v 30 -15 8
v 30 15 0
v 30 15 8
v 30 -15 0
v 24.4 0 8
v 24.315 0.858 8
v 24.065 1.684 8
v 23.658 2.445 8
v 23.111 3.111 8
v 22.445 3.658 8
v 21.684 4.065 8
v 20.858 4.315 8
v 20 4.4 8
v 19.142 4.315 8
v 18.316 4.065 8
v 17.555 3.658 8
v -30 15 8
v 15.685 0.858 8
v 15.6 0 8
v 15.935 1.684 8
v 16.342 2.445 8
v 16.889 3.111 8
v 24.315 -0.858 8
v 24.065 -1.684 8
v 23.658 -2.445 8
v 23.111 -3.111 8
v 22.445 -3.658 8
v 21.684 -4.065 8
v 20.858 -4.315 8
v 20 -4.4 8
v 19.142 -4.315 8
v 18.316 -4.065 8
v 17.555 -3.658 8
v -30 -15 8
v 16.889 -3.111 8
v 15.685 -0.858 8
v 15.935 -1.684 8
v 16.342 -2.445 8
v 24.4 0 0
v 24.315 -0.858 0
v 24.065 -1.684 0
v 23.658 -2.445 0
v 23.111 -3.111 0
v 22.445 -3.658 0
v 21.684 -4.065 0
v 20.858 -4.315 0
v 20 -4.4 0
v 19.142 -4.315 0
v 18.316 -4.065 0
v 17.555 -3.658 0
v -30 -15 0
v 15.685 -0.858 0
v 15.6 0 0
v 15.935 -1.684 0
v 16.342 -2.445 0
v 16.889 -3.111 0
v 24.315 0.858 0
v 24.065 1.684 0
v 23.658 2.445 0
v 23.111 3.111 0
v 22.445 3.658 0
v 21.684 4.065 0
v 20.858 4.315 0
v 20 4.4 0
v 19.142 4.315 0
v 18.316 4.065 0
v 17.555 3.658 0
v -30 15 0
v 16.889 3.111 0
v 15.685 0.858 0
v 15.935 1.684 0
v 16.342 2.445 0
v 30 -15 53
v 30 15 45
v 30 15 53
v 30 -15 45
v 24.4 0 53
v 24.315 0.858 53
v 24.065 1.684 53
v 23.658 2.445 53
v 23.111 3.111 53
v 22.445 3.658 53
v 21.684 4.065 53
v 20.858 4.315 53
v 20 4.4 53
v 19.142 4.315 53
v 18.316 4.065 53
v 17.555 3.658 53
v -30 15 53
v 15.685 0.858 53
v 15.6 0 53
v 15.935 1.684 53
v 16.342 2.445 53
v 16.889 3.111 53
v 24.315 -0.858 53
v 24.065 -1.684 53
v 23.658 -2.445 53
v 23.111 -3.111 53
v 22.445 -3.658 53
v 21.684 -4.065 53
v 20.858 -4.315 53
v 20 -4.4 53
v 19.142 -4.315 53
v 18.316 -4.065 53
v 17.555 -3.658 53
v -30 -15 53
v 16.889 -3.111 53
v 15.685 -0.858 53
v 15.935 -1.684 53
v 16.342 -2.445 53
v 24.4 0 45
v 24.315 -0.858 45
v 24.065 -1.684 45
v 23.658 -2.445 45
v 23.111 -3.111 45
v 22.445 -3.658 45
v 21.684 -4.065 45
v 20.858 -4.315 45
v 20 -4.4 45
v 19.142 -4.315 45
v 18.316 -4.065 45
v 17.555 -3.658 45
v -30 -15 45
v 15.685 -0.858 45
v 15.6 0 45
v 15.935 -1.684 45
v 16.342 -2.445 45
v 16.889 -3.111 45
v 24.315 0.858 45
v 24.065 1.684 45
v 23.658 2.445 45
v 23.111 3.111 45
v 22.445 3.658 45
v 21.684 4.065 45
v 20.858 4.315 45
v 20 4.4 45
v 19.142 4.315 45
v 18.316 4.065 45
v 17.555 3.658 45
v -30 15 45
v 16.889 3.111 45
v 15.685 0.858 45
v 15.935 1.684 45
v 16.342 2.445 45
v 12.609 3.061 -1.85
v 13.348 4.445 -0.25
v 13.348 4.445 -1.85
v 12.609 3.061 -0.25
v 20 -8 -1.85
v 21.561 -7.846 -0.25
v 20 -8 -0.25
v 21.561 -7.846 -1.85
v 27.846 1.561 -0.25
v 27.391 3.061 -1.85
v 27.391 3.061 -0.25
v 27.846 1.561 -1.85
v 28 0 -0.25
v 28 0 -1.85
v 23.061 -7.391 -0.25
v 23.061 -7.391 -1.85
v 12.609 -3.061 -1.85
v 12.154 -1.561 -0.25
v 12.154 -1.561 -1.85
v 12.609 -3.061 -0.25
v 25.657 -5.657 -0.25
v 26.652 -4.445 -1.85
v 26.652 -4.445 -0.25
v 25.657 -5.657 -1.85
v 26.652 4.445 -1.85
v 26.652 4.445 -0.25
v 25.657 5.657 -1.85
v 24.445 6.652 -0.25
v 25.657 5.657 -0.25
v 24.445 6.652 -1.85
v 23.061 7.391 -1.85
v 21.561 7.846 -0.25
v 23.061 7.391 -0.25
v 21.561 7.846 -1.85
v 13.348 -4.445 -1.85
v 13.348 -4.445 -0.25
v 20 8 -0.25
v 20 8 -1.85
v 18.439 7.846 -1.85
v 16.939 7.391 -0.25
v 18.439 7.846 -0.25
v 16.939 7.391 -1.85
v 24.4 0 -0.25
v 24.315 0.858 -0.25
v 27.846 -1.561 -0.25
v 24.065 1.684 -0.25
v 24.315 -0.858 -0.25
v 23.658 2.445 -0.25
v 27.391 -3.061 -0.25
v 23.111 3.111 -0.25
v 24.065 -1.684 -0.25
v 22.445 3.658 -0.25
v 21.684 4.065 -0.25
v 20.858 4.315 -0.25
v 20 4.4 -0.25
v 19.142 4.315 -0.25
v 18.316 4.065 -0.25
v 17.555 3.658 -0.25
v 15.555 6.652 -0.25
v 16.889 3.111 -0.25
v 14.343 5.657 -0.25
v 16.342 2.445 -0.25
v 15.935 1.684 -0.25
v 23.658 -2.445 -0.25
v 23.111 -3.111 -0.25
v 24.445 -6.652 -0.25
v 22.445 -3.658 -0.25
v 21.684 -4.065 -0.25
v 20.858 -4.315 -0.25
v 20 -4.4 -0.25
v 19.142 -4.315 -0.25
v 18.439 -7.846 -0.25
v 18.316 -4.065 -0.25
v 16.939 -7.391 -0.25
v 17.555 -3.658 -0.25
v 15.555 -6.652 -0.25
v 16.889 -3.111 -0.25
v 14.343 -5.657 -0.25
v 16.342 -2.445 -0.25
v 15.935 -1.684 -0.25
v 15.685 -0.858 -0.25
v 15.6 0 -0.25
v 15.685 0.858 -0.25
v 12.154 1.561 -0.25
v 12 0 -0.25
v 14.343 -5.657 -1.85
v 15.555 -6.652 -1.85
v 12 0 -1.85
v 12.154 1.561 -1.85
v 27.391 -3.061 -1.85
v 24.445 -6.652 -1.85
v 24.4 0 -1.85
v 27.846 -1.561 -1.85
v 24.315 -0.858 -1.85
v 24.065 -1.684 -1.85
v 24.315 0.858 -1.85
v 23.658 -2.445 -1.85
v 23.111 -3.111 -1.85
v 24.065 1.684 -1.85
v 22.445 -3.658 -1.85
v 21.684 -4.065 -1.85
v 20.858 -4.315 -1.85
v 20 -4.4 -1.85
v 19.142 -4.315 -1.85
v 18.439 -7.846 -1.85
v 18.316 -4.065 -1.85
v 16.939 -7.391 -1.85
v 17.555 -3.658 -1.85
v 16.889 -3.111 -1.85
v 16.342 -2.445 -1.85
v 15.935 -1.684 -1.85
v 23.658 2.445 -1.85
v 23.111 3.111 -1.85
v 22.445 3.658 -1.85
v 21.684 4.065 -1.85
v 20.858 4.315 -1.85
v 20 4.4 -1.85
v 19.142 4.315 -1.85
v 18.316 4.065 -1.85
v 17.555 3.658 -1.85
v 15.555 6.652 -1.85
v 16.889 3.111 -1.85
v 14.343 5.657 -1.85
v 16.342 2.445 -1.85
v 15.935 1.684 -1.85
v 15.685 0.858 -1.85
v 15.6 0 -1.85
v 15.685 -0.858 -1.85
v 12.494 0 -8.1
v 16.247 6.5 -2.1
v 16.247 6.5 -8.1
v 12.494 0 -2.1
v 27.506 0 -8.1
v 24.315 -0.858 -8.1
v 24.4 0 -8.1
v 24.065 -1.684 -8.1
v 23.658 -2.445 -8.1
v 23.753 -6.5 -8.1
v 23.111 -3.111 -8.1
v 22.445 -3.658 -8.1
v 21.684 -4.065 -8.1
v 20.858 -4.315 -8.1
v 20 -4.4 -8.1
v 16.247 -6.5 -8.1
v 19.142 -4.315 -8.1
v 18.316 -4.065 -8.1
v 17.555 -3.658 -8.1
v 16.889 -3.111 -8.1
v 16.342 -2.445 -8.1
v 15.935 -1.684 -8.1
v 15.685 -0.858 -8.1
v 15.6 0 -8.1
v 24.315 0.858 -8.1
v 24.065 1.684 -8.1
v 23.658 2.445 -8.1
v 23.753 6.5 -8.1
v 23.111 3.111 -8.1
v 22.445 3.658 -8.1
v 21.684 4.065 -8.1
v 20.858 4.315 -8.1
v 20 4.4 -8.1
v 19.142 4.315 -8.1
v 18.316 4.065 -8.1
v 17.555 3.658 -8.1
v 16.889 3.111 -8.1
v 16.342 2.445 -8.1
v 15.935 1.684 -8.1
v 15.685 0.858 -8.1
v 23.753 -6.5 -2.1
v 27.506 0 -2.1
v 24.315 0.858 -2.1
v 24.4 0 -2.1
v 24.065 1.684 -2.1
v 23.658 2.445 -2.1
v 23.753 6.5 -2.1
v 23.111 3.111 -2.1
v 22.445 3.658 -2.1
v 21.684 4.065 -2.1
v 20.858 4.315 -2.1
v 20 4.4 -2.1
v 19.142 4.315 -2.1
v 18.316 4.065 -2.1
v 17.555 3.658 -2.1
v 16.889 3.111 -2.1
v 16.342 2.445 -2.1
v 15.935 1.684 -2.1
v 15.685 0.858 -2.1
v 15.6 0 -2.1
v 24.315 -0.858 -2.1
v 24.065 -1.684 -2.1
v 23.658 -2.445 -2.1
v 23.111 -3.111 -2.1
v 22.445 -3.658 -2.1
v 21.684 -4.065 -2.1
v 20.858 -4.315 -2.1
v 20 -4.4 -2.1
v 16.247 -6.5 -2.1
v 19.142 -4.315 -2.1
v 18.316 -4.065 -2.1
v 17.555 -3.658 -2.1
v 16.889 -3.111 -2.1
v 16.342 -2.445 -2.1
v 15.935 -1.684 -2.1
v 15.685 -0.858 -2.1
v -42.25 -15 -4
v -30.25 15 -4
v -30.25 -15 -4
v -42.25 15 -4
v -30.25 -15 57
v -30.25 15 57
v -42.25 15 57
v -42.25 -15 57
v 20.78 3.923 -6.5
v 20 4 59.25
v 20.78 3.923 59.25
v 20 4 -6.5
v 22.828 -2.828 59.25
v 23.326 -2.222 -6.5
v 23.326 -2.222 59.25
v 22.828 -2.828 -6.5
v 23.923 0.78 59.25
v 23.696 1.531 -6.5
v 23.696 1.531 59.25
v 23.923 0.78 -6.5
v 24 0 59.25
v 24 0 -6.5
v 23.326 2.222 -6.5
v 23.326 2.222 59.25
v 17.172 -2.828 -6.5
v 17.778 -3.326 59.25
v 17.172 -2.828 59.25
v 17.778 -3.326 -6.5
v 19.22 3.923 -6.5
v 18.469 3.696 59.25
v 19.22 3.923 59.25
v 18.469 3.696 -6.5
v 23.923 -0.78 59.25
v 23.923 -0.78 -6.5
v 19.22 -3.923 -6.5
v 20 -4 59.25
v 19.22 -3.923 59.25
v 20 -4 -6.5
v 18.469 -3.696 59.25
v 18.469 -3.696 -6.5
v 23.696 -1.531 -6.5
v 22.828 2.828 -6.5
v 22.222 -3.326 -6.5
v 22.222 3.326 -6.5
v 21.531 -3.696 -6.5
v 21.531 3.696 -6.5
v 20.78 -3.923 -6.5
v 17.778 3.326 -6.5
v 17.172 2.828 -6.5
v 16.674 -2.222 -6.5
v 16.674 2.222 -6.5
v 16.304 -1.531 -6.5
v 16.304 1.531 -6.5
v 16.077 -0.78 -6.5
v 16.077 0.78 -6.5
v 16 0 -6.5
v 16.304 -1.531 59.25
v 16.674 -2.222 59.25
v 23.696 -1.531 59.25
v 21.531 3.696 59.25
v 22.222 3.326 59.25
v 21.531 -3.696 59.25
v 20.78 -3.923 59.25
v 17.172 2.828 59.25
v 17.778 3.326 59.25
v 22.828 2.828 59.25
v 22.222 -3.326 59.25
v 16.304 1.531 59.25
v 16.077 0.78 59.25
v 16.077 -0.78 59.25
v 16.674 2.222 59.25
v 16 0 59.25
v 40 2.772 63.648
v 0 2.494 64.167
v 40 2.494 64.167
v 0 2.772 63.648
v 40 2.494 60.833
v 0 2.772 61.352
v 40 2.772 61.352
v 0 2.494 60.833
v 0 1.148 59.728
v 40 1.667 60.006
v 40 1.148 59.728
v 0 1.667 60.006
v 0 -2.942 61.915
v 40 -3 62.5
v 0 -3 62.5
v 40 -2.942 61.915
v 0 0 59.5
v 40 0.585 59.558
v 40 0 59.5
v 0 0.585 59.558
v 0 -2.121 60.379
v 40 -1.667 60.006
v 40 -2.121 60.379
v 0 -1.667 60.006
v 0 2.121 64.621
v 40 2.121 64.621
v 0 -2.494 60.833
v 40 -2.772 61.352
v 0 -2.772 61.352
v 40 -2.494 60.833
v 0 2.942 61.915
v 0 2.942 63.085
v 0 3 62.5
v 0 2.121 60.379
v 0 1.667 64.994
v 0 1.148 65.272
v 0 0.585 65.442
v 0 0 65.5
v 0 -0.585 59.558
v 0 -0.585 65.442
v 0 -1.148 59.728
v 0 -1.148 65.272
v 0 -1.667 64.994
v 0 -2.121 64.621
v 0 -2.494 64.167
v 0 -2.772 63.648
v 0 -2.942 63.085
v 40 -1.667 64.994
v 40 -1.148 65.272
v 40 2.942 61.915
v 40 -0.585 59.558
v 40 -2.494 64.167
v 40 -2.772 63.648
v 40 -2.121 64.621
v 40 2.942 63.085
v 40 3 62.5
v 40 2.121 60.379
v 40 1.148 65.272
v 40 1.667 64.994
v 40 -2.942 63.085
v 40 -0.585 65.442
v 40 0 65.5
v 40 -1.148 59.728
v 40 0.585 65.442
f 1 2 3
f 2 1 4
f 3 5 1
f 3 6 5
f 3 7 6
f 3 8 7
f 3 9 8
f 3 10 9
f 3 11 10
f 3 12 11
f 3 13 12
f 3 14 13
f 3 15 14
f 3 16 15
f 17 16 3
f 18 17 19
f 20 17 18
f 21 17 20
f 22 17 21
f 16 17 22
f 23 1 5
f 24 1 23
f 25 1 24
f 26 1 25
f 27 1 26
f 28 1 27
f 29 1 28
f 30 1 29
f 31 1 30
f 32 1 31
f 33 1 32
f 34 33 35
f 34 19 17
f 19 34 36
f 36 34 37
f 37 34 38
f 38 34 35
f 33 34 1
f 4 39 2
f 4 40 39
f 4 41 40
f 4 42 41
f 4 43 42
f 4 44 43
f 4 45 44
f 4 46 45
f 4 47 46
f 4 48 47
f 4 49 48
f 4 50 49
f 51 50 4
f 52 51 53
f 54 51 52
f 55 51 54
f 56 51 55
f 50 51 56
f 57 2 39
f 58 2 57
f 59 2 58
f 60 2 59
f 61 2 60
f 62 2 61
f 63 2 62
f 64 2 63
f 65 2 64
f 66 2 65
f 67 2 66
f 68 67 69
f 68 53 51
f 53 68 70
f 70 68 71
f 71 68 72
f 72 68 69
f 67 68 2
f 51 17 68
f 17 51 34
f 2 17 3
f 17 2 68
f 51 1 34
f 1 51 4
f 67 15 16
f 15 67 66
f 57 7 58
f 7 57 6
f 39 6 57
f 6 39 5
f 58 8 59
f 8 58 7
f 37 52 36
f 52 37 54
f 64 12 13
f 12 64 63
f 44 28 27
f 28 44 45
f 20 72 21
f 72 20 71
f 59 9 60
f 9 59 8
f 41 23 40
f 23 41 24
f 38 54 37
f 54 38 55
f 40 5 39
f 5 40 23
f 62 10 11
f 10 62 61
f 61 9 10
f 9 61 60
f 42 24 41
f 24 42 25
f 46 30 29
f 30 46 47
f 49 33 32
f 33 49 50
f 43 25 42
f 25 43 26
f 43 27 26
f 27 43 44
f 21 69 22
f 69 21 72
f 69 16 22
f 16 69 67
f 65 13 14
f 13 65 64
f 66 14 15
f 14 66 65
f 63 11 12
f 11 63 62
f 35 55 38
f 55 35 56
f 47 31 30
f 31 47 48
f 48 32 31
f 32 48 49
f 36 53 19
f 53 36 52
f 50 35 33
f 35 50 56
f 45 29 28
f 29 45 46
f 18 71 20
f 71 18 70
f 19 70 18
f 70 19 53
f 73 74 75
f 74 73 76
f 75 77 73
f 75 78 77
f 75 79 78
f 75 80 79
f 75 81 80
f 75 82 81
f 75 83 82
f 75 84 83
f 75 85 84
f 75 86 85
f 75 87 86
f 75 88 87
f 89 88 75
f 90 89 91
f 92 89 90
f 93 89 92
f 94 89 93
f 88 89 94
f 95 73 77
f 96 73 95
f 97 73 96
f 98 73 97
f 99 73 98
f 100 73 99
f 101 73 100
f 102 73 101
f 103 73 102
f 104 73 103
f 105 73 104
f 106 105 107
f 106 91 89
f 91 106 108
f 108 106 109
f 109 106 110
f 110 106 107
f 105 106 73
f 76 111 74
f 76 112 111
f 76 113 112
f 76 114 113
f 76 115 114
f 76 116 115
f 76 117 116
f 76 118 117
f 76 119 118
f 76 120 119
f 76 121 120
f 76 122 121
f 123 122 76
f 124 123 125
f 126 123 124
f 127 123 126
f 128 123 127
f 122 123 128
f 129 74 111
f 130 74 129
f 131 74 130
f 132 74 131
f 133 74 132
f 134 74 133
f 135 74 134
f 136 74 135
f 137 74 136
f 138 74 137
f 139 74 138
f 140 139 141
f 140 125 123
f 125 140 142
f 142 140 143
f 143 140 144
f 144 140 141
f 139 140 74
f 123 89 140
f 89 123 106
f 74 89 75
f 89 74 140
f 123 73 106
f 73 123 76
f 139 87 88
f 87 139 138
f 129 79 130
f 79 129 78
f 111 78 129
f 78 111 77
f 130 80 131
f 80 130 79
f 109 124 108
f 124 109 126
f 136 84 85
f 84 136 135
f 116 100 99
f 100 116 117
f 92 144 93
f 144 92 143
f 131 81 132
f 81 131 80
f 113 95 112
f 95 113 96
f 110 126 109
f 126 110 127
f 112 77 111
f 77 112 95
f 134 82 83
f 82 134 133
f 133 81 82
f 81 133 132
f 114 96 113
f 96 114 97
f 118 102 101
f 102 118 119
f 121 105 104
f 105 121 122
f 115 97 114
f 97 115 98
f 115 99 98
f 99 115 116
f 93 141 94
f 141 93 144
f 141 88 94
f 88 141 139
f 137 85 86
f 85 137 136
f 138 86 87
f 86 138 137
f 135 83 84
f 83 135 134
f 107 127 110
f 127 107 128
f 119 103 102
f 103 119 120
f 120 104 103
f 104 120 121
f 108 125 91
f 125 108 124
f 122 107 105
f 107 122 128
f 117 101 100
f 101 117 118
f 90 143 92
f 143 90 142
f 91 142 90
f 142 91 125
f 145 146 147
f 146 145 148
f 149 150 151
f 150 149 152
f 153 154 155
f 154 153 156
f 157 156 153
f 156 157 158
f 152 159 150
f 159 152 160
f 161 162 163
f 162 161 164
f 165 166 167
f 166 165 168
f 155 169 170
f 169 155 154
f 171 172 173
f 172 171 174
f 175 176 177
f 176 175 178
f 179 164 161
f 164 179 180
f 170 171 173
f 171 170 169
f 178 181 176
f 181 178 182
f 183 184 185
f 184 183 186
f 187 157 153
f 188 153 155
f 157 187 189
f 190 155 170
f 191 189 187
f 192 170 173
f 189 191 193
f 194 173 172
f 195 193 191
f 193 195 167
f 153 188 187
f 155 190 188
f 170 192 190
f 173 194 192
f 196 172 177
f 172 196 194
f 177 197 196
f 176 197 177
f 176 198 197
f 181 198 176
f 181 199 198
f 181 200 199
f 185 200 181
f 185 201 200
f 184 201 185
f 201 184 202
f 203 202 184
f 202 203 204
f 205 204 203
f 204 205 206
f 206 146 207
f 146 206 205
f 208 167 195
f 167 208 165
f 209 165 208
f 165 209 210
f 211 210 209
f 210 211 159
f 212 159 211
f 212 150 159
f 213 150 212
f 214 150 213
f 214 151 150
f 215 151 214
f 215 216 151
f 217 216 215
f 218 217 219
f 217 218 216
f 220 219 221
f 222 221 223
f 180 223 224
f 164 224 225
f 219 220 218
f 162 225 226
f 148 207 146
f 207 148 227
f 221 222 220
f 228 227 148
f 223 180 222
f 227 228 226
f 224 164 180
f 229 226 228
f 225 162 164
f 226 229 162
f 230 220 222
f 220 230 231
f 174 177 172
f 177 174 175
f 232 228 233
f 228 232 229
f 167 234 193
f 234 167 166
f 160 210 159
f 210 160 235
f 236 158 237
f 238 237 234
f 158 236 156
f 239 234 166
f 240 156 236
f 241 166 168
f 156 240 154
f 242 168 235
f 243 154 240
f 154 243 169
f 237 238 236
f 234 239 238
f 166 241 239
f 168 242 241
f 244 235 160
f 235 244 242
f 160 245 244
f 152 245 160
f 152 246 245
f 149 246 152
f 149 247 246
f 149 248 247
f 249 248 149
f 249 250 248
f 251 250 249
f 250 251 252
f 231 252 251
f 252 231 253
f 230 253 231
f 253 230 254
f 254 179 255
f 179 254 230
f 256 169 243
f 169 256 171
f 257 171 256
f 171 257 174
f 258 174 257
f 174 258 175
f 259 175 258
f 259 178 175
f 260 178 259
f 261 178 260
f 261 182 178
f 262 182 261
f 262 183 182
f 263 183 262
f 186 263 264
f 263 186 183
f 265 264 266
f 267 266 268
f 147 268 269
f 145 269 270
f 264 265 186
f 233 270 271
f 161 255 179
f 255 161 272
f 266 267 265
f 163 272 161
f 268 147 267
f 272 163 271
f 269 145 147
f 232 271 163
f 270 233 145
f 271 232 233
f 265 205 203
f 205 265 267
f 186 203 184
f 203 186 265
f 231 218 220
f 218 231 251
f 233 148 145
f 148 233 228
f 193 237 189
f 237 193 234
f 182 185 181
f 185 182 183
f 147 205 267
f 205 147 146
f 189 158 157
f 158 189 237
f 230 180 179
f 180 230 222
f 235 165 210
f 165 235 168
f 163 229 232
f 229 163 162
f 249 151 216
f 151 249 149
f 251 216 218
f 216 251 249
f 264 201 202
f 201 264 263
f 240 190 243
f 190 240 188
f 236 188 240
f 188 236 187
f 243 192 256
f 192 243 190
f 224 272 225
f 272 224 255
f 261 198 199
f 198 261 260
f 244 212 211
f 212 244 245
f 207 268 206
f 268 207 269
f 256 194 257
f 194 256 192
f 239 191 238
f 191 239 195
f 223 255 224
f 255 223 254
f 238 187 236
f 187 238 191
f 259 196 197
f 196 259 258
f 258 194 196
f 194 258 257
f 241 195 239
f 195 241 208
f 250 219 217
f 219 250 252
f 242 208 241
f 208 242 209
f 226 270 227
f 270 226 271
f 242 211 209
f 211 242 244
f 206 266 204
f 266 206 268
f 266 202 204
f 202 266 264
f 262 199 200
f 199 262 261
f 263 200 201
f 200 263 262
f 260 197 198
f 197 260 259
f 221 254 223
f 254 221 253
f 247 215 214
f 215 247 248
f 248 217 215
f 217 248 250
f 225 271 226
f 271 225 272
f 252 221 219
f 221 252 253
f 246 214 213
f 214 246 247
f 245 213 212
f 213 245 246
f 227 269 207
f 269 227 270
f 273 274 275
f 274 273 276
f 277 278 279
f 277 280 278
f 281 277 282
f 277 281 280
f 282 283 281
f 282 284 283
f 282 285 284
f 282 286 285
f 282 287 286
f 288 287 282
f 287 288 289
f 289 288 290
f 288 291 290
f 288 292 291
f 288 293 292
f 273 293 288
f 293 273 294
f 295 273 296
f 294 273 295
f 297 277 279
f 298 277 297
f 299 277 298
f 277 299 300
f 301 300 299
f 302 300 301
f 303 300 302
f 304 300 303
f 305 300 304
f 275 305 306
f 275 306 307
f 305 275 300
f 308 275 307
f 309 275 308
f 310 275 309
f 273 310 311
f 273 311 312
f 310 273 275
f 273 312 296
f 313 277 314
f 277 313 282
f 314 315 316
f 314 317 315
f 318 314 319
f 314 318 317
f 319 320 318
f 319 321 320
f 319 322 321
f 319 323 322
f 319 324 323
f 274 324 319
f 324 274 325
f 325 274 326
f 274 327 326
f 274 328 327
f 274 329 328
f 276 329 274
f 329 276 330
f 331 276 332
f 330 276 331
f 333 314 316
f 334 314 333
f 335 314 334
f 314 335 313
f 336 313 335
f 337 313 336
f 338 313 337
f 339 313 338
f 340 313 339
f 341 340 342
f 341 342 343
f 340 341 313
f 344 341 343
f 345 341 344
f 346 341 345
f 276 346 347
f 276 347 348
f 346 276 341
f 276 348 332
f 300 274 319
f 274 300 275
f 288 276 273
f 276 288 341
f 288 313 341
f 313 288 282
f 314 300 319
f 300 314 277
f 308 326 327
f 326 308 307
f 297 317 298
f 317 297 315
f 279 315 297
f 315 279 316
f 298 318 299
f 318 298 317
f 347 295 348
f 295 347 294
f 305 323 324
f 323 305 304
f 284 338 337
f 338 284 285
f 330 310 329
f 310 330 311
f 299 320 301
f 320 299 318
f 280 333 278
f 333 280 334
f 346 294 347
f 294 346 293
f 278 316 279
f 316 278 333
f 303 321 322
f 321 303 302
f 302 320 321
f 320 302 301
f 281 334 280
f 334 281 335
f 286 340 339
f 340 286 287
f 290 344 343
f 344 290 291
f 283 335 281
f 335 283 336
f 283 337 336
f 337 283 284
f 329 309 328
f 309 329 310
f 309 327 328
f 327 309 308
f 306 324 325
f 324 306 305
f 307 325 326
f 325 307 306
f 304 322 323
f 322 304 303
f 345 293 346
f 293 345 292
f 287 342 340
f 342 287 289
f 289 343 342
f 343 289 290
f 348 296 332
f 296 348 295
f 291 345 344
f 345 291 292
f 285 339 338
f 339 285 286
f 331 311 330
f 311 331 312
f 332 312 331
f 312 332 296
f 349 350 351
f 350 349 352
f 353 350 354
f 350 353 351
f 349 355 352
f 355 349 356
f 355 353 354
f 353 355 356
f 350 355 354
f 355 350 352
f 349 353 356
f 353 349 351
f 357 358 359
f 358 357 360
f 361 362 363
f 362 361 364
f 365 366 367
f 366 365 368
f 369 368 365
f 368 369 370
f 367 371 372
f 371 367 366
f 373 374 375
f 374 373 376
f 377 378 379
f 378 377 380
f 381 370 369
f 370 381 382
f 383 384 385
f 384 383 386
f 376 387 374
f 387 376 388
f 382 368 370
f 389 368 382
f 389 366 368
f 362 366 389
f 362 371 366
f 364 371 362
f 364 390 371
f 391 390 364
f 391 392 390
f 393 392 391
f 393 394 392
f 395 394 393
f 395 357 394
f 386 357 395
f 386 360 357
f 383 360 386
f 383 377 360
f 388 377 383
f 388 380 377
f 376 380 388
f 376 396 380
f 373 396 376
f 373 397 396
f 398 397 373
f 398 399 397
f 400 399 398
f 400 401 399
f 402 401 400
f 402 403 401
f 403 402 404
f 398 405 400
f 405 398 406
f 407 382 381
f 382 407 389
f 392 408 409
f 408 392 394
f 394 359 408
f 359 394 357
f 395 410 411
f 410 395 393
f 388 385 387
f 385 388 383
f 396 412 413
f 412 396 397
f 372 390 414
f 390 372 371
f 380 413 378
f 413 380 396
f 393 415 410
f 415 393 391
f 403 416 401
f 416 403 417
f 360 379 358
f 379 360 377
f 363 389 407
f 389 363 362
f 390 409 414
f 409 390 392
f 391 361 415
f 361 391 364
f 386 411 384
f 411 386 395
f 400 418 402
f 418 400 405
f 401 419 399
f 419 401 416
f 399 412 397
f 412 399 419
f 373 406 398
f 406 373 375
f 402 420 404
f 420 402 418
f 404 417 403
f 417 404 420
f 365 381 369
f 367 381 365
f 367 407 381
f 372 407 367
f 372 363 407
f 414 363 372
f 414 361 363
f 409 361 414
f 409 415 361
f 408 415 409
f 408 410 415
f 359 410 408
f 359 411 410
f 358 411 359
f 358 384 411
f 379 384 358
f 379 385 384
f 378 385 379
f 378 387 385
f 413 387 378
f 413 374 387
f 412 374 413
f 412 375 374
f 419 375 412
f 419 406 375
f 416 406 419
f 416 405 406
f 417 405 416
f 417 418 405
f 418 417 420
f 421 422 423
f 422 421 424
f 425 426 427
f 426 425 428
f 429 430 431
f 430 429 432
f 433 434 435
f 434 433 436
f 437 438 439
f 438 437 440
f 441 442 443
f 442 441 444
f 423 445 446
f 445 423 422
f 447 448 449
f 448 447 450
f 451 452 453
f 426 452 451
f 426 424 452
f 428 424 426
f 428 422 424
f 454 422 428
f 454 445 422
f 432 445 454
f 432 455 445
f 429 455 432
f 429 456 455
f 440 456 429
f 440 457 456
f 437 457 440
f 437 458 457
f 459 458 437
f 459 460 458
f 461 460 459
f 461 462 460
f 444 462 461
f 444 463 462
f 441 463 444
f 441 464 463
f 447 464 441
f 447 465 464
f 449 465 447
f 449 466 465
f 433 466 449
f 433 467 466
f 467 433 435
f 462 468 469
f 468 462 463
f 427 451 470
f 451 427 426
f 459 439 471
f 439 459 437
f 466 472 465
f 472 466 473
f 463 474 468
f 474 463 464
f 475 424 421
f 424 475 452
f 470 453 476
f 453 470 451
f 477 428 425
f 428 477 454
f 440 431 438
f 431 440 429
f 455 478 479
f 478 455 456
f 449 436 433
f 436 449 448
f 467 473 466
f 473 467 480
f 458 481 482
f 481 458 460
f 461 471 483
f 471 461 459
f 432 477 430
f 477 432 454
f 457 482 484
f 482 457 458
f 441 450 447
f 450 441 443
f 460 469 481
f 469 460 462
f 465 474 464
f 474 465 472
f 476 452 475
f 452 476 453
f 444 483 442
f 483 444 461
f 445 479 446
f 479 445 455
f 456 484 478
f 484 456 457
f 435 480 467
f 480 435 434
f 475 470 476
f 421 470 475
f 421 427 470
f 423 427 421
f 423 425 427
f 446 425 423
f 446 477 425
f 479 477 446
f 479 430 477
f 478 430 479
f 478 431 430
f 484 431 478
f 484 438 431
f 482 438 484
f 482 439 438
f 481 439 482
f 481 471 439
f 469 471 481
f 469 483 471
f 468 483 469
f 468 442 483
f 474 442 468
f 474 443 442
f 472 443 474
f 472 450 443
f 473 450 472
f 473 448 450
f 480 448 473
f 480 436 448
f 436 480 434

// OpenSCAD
$fn = 32;

// ------------------------------------------------------------------------
// C clamp: throat 45 mm, screw d8
// Every part is its own module, assembly() places every instance.
// ------------------------------------------------------------------------

// --- part 1 ---
module clamp_arm() {
  difference() {
    translate([-30, -15, 0]) cube([60, 30, 8]);
    translate([20, 0, -1]) cylinder(h = 10, d = 8.8);
  }
}

// --- part 2 ---
module clamp_spine() {
  difference() {
    translate([-30.5, -15, 0]) cube([61, 30, 12]);
  }
}

// --- part 3 ---
module clamp_screw() {
  translate([0, 0, -32.875]) cylinder(h = 65.75, d = 8);
}

// --- part 4 ---
module clamp_washer() {
  difference() {
      translate([0, 0, 0]) cylinder(h = 1.6, d = 16);
      translate([0, 0, -1]) cylinder(h = 3.6, d = 8.8);
    }
}

// --- part 5 ---
module clamp_nut() {
  difference() {
    linear_extrude(height = 6) polygon(points = [[7.506, 0], [3.753, 6.5], [-3.753, 6.5], [-7.506, 0], [-3.753, -6.5], [3.753, -6.5]]);
    translate([0, 0, -1]) cylinder(h = 8, d = 8.8);
  }
}

// --- part 6 ---
module tommy_bar() {
  translate([0, 0, -20]) cylinder(h = 40, d = 6);
}

// --- assembly ---
module assembly() {
  color([0.80, 0.24, 0.20]) translate([0, 0, 0]) rotate([0, 0, 0]) clamp_arm();
  color([0.20, 0.45, 0.75]) translate([0, 0, 45]) rotate([0, 0, 0]) clamp_arm();
  color([0.25, 0.62, 0.32]) translate([-42.25, 0, 26.5]) rotate([0, 90, 0]) clamp_spine();
  color([0.92, 0.70, 0.18]) translate([20, 0, 26.375]) rotate([0, 0, 0]) clamp_screw();
  color([0.58, 0.35, 0.70]) translate([20, 0, -1.85]) rotate([0, 0, 0]) clamp_washer();
  color([0.16, 0.66, 0.66]) translate([20, 0, -8.1]) rotate([0, 0, 0]) clamp_nut();
  color([0.85, 0.48, 0.18]) translate([20, 0, 62.5]) rotate([0, 90, 0]) tommy_bar();
}

assembly();
